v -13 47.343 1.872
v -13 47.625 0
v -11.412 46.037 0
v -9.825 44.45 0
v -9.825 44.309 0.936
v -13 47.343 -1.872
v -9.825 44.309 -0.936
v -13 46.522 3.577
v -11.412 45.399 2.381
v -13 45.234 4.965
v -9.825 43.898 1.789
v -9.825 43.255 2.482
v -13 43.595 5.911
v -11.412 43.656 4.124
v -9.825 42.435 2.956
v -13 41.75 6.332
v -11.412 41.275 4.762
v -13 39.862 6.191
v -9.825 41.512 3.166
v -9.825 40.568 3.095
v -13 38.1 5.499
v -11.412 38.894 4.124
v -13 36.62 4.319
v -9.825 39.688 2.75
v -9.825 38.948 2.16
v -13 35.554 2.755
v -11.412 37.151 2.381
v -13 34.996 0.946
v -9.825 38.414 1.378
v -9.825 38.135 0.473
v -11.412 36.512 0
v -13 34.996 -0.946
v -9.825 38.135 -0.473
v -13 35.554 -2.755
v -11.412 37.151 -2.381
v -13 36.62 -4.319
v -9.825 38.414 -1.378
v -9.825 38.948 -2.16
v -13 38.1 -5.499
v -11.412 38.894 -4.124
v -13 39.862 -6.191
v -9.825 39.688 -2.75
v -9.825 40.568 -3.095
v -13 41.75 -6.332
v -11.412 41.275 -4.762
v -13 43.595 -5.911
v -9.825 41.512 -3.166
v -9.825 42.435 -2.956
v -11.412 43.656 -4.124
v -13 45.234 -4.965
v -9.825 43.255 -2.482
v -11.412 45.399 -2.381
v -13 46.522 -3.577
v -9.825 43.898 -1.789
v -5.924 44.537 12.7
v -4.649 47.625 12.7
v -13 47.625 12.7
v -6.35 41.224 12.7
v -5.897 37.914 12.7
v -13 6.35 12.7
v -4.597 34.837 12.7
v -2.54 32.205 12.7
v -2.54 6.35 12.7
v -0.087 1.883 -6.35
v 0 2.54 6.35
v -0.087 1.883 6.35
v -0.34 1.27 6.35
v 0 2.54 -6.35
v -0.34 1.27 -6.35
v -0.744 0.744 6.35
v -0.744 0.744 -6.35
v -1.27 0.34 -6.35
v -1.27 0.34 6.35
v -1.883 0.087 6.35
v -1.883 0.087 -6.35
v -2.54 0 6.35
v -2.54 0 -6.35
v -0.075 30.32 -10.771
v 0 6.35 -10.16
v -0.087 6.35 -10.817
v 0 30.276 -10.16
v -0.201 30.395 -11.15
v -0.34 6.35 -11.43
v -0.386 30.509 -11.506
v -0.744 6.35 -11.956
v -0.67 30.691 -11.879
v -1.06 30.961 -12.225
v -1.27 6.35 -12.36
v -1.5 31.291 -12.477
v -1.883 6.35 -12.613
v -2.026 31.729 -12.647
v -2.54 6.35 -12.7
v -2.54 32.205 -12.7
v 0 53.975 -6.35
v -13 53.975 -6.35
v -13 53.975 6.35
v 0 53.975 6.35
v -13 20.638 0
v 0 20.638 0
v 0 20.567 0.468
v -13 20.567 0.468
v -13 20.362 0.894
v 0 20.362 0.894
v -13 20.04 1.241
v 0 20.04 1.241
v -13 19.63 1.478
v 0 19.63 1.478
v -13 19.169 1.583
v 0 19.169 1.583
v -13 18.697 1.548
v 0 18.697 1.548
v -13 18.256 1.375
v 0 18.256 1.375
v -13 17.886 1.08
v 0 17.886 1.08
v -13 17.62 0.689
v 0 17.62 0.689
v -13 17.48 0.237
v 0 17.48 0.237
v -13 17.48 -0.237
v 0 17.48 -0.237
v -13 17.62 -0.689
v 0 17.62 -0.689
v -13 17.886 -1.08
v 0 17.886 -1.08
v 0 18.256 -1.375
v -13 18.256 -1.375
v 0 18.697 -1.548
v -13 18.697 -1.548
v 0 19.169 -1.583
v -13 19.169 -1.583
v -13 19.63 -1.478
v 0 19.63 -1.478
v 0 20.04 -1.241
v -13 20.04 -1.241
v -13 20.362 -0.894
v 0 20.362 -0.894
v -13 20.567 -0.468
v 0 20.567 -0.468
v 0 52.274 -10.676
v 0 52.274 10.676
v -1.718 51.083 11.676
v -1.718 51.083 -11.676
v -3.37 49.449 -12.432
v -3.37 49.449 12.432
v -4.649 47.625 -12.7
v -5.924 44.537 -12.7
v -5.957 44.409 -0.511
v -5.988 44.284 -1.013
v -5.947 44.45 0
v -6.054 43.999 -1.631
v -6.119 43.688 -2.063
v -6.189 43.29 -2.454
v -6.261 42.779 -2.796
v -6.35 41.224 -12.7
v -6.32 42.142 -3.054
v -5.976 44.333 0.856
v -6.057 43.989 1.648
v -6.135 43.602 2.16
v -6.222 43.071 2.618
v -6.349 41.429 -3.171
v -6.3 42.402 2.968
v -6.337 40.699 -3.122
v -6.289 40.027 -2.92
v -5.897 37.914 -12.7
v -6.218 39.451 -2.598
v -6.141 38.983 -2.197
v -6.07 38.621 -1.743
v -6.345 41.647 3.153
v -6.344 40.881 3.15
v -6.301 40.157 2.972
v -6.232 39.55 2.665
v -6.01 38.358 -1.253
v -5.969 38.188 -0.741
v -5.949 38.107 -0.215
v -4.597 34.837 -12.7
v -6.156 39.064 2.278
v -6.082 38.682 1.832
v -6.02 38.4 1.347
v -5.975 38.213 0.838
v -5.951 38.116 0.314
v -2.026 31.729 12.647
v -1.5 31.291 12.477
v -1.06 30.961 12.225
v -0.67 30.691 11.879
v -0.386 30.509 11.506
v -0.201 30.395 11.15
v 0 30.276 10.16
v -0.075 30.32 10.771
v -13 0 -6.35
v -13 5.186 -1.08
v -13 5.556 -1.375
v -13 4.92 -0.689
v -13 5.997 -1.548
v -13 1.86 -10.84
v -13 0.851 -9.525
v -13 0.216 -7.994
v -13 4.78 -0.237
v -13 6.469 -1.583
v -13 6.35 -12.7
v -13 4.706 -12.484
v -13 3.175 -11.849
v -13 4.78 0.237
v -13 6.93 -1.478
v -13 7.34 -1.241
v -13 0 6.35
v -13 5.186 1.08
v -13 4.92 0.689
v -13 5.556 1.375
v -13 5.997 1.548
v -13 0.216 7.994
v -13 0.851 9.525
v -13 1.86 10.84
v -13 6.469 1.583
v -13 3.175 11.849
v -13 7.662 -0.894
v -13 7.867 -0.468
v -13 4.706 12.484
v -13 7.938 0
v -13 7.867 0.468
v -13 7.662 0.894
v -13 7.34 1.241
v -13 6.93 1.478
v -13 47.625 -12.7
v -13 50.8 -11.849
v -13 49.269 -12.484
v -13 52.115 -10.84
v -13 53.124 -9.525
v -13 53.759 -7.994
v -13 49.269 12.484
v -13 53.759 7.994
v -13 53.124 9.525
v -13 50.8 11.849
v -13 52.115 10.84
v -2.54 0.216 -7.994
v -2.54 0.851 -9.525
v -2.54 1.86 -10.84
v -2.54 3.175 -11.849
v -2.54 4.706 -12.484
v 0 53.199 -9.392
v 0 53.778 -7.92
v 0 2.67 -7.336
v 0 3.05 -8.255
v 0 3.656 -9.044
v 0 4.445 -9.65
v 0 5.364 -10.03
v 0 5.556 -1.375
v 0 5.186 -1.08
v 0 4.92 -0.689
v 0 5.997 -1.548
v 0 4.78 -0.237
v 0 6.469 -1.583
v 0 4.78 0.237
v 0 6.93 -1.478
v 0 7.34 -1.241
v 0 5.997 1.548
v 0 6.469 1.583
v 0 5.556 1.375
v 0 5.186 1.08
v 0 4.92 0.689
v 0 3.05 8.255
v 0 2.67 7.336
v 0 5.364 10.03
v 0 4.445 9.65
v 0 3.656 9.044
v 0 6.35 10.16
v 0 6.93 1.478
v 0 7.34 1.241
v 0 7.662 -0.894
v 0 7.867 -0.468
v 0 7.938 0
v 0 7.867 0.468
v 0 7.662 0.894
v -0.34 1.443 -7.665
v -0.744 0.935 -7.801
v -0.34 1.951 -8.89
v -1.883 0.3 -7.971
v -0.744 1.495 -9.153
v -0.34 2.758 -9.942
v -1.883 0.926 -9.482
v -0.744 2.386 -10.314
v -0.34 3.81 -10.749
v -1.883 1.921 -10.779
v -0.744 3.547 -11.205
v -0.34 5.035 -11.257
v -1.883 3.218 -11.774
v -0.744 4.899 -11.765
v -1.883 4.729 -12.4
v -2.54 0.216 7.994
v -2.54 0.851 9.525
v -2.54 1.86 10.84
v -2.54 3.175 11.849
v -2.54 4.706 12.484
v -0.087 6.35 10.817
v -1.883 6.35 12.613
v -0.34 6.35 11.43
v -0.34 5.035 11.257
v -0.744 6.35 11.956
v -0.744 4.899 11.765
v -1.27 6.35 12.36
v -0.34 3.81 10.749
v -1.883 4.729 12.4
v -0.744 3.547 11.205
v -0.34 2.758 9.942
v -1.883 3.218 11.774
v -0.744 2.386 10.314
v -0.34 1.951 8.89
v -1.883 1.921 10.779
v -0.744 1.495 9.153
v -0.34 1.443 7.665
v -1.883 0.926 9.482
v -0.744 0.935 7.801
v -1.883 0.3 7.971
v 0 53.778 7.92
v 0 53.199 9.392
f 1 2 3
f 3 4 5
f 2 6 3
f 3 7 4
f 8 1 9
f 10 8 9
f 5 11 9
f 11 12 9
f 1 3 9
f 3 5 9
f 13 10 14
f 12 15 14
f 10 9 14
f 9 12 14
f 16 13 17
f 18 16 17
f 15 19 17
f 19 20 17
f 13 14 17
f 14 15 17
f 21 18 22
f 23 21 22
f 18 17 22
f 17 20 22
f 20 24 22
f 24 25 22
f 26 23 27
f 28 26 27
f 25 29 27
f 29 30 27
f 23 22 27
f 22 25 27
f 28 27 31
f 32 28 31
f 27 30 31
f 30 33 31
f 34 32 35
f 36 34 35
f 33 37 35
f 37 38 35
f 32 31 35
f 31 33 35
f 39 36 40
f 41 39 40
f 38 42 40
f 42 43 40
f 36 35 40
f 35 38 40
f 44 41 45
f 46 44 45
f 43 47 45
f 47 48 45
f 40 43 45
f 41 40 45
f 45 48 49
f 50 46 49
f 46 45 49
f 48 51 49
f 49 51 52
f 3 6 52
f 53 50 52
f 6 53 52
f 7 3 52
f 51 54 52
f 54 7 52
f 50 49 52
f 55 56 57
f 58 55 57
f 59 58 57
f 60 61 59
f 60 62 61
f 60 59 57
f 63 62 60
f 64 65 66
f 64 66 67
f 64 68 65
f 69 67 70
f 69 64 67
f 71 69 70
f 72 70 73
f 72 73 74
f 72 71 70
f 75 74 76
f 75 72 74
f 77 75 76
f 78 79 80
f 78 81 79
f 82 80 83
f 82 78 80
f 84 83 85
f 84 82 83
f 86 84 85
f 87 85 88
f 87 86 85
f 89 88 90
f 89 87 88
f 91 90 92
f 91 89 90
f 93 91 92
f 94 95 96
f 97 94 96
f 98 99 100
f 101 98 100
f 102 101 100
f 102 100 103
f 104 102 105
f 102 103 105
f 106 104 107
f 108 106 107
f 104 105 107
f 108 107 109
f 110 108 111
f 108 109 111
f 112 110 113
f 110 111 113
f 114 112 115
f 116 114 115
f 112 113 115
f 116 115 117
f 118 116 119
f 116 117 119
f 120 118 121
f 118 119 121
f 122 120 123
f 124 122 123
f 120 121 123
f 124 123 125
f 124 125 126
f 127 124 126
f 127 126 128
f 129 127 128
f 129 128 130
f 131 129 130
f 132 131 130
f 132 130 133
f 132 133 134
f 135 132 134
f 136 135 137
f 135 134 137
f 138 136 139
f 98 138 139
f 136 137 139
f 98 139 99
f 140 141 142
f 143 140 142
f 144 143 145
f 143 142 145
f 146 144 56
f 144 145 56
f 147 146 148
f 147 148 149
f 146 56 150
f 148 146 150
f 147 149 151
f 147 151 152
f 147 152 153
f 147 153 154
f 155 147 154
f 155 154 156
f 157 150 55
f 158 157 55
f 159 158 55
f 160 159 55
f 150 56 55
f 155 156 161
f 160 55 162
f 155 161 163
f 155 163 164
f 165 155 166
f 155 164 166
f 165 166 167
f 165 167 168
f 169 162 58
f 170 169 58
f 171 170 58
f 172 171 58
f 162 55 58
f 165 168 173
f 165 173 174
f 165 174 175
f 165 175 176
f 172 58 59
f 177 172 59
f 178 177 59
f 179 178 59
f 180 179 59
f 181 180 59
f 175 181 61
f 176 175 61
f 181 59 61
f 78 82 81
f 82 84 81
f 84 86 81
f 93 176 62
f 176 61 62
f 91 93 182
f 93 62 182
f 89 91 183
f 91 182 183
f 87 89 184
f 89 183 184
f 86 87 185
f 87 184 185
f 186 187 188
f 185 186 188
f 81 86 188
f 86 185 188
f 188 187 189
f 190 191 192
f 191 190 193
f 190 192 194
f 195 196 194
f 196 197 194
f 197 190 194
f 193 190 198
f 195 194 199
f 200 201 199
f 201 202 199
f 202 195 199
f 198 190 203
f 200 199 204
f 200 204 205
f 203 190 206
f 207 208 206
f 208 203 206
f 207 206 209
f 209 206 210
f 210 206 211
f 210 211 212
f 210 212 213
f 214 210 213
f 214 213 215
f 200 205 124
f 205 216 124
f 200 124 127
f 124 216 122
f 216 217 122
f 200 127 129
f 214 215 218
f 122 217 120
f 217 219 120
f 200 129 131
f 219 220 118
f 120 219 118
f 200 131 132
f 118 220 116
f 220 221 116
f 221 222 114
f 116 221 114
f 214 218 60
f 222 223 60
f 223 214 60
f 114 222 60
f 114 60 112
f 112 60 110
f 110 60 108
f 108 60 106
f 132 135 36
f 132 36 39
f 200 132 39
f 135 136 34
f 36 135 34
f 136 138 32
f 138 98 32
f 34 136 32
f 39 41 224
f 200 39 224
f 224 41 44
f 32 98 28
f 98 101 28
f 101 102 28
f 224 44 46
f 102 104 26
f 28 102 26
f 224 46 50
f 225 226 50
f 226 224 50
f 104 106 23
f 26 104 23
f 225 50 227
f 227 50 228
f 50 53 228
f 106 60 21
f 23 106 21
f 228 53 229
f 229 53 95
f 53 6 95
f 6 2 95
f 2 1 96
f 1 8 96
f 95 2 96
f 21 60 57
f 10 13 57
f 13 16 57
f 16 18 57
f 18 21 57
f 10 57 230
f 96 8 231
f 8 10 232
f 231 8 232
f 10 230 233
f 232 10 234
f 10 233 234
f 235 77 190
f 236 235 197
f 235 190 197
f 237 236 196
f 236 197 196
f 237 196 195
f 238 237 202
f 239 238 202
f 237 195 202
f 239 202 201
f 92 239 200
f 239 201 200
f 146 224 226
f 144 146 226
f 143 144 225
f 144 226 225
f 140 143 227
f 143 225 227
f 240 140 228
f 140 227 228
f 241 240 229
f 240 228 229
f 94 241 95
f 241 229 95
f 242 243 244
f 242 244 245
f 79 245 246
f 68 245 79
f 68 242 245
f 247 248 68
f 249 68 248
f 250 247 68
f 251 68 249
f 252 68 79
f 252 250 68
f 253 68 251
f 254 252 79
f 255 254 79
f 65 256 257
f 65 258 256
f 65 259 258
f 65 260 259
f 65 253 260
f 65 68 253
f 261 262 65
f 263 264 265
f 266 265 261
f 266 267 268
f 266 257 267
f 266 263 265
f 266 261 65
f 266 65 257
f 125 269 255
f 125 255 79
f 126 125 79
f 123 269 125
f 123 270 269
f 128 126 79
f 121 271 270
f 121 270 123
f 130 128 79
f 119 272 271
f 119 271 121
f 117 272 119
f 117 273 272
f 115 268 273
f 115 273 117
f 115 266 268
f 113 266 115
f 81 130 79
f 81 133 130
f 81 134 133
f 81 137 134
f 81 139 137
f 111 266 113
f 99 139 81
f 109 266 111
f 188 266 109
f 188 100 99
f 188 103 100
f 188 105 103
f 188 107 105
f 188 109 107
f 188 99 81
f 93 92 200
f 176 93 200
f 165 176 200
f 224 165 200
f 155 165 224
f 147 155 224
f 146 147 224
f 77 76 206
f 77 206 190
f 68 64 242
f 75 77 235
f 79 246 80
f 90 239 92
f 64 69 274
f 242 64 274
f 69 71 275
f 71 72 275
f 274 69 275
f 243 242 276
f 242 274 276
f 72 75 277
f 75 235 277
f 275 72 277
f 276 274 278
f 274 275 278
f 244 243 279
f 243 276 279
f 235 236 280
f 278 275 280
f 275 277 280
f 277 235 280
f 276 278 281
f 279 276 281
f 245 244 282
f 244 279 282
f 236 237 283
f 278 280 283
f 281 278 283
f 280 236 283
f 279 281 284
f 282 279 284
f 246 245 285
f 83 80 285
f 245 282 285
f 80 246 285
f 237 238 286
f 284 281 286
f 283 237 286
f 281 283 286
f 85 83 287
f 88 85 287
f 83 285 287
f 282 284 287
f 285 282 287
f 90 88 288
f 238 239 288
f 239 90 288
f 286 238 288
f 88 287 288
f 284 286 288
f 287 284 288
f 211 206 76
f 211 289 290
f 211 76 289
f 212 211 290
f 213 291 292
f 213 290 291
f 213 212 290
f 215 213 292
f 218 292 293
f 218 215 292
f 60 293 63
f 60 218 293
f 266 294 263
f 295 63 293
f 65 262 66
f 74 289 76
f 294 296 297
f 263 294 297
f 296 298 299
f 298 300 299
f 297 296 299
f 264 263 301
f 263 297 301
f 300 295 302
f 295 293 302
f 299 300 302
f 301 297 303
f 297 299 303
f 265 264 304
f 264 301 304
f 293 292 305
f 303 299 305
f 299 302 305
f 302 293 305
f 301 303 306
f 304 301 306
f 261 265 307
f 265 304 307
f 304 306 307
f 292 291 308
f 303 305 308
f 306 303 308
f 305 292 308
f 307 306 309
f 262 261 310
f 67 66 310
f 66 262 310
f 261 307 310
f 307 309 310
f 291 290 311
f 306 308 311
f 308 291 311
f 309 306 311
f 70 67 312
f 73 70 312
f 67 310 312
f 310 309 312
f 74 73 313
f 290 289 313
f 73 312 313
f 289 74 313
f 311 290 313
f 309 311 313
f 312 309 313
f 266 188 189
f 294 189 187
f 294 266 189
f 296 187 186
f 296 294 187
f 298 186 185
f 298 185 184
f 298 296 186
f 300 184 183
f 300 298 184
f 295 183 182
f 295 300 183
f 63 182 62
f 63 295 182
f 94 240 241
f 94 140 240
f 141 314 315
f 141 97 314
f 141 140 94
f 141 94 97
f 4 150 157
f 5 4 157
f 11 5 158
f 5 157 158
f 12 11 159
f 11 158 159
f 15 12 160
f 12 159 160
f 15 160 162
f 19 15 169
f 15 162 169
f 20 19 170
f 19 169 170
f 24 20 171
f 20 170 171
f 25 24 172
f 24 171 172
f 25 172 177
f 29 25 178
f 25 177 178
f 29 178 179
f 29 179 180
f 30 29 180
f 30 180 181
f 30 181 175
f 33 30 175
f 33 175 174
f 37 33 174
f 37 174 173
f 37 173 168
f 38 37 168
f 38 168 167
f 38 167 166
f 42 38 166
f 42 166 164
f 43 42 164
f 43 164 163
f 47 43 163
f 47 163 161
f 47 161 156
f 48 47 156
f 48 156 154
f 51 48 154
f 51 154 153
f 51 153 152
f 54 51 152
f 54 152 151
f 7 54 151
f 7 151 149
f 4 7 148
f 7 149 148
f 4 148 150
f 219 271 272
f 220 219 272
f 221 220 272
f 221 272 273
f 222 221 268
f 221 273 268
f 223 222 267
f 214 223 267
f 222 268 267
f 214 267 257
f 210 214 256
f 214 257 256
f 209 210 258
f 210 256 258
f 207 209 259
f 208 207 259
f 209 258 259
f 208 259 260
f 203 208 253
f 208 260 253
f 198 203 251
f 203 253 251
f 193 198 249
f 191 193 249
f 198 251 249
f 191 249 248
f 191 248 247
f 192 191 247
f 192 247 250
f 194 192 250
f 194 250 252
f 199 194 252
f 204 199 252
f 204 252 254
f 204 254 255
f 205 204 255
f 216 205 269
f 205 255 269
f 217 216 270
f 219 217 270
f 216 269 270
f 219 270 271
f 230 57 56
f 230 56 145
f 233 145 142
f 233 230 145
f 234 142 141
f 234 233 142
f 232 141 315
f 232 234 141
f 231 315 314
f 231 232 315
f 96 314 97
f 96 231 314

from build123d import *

# Parameters (mm, degrees)
F0_R        = 1.5875
F0_R_2      = 3.175
F1_DEPTH    = 13
F3_DEPTH    = 37.5
F4_T1_DEPTH = 44.75
F5_R        = 2.54
F6_SIZE     = 3.175


# Not quite as in the source:
# - a fillet or chamfer that OpenCascade refuses, or shapes differently, is made with other operations: its cross-section is extruded or revolved along the edge and cut away or added
# - a feature names something its author has since deleted; it is built from what else it names


with BuildPart() as f1:
    # F0 (on Right) → F1 (new body)
    with BuildSketch(Plane.YZ):
        Polygon((0, 0), (0, -12.7), (53.975, -12.7), (53.975, 12.7), (0, 12.7), align=None)
        with Locations((6.35, 0)):
            Circle(F0_R, mode=Mode.SUBTRACT)
        with Locations((19.05, 0)):
            Circle(F0_R, mode=Mode.SUBTRACT)
        with Locations((41.275, 0)):
            Circle(F0_R_2, mode=Mode.SUBTRACT)
    extrude(amount=-F1_DEPTH)

    # F2 (on Top) → F3 (cut, symmetric)
    with BuildSketch(Plane.XY):
        with BuildLine():
            Line((0, 30.2764773719), (0, 52.2735226281))
            ThreePointArc((0, 52.2735226281), (-6.35, 41.275), (0, 30.2764773719))
        make_face()
    extrude(amount=F3_DEPTH, both=True, mode=Mode.SUBTRACT)

    # F4: fillet of radius 6.35 on 4 edges, made by hand

    # F4_s2 → F4_t1 (cut)
    with BuildSketch(Plane.YZ.offset(-28.875)):
        with BuildLine():
            ThreePointArc((0, -6.35), (1.8598719395, -10.8401280605), (6.35, -12.7))
            Line((6.35, -12.7), (0, -12.7))
            Line((0, -12.7), (0, -6.35))
        make_face()
        with BuildLine():
            ThreePointArc((0, 6.35), (1.8598719395, 10.8401280605), (6.35, 12.7))
            Line((6.35, 12.7), (0, 12.7))
            Line((0, 12.7), (0, 6.35))
        make_face()
        with BuildLine():
            ThreePointArc((47.625, -12.7), (52.1151280605, -10.8401280605), (53.975, -6.35))
            Line((53.975, -6.35), (53.975, -12.7))
            Line((53.975, -12.7), (47.625, -12.7))
        make_face()
        with BuildLine():
            ThreePointArc((47.625, 12.7), (52.1151280605, 10.8401280605), (53.975, 6.35))
            Line((53.975, 6.35), (53.975, 12.7))
            Line((53.975, 12.7), (47.625, 12.7))
        make_face()
    extrude(amount=F4_T1_DEPTH, mode=Mode.SUBTRACT)

    # F5
    f5_edges = [f1.edges().sort_by_distance(p)[0] for p in [
        (-6.5, 0, 6.35),
        (0, 0, 0),
        (0, 1.859872, -10.840128),
        (0, 1.859872, 10.840128),
        (0, 18.313239, 12.7),
        (0, 18.313239, -12.7),
    ]]
    fillet(f5_edges, radius=F5_R)

    # F6
    f6_edges = [f1.edges().sort_by_distance(p)[0] for p in [
        (-13, 38.1, 0),
    ]]
    chamfer(f6_edges, length=F6_SIZE)


solid = f1.part
